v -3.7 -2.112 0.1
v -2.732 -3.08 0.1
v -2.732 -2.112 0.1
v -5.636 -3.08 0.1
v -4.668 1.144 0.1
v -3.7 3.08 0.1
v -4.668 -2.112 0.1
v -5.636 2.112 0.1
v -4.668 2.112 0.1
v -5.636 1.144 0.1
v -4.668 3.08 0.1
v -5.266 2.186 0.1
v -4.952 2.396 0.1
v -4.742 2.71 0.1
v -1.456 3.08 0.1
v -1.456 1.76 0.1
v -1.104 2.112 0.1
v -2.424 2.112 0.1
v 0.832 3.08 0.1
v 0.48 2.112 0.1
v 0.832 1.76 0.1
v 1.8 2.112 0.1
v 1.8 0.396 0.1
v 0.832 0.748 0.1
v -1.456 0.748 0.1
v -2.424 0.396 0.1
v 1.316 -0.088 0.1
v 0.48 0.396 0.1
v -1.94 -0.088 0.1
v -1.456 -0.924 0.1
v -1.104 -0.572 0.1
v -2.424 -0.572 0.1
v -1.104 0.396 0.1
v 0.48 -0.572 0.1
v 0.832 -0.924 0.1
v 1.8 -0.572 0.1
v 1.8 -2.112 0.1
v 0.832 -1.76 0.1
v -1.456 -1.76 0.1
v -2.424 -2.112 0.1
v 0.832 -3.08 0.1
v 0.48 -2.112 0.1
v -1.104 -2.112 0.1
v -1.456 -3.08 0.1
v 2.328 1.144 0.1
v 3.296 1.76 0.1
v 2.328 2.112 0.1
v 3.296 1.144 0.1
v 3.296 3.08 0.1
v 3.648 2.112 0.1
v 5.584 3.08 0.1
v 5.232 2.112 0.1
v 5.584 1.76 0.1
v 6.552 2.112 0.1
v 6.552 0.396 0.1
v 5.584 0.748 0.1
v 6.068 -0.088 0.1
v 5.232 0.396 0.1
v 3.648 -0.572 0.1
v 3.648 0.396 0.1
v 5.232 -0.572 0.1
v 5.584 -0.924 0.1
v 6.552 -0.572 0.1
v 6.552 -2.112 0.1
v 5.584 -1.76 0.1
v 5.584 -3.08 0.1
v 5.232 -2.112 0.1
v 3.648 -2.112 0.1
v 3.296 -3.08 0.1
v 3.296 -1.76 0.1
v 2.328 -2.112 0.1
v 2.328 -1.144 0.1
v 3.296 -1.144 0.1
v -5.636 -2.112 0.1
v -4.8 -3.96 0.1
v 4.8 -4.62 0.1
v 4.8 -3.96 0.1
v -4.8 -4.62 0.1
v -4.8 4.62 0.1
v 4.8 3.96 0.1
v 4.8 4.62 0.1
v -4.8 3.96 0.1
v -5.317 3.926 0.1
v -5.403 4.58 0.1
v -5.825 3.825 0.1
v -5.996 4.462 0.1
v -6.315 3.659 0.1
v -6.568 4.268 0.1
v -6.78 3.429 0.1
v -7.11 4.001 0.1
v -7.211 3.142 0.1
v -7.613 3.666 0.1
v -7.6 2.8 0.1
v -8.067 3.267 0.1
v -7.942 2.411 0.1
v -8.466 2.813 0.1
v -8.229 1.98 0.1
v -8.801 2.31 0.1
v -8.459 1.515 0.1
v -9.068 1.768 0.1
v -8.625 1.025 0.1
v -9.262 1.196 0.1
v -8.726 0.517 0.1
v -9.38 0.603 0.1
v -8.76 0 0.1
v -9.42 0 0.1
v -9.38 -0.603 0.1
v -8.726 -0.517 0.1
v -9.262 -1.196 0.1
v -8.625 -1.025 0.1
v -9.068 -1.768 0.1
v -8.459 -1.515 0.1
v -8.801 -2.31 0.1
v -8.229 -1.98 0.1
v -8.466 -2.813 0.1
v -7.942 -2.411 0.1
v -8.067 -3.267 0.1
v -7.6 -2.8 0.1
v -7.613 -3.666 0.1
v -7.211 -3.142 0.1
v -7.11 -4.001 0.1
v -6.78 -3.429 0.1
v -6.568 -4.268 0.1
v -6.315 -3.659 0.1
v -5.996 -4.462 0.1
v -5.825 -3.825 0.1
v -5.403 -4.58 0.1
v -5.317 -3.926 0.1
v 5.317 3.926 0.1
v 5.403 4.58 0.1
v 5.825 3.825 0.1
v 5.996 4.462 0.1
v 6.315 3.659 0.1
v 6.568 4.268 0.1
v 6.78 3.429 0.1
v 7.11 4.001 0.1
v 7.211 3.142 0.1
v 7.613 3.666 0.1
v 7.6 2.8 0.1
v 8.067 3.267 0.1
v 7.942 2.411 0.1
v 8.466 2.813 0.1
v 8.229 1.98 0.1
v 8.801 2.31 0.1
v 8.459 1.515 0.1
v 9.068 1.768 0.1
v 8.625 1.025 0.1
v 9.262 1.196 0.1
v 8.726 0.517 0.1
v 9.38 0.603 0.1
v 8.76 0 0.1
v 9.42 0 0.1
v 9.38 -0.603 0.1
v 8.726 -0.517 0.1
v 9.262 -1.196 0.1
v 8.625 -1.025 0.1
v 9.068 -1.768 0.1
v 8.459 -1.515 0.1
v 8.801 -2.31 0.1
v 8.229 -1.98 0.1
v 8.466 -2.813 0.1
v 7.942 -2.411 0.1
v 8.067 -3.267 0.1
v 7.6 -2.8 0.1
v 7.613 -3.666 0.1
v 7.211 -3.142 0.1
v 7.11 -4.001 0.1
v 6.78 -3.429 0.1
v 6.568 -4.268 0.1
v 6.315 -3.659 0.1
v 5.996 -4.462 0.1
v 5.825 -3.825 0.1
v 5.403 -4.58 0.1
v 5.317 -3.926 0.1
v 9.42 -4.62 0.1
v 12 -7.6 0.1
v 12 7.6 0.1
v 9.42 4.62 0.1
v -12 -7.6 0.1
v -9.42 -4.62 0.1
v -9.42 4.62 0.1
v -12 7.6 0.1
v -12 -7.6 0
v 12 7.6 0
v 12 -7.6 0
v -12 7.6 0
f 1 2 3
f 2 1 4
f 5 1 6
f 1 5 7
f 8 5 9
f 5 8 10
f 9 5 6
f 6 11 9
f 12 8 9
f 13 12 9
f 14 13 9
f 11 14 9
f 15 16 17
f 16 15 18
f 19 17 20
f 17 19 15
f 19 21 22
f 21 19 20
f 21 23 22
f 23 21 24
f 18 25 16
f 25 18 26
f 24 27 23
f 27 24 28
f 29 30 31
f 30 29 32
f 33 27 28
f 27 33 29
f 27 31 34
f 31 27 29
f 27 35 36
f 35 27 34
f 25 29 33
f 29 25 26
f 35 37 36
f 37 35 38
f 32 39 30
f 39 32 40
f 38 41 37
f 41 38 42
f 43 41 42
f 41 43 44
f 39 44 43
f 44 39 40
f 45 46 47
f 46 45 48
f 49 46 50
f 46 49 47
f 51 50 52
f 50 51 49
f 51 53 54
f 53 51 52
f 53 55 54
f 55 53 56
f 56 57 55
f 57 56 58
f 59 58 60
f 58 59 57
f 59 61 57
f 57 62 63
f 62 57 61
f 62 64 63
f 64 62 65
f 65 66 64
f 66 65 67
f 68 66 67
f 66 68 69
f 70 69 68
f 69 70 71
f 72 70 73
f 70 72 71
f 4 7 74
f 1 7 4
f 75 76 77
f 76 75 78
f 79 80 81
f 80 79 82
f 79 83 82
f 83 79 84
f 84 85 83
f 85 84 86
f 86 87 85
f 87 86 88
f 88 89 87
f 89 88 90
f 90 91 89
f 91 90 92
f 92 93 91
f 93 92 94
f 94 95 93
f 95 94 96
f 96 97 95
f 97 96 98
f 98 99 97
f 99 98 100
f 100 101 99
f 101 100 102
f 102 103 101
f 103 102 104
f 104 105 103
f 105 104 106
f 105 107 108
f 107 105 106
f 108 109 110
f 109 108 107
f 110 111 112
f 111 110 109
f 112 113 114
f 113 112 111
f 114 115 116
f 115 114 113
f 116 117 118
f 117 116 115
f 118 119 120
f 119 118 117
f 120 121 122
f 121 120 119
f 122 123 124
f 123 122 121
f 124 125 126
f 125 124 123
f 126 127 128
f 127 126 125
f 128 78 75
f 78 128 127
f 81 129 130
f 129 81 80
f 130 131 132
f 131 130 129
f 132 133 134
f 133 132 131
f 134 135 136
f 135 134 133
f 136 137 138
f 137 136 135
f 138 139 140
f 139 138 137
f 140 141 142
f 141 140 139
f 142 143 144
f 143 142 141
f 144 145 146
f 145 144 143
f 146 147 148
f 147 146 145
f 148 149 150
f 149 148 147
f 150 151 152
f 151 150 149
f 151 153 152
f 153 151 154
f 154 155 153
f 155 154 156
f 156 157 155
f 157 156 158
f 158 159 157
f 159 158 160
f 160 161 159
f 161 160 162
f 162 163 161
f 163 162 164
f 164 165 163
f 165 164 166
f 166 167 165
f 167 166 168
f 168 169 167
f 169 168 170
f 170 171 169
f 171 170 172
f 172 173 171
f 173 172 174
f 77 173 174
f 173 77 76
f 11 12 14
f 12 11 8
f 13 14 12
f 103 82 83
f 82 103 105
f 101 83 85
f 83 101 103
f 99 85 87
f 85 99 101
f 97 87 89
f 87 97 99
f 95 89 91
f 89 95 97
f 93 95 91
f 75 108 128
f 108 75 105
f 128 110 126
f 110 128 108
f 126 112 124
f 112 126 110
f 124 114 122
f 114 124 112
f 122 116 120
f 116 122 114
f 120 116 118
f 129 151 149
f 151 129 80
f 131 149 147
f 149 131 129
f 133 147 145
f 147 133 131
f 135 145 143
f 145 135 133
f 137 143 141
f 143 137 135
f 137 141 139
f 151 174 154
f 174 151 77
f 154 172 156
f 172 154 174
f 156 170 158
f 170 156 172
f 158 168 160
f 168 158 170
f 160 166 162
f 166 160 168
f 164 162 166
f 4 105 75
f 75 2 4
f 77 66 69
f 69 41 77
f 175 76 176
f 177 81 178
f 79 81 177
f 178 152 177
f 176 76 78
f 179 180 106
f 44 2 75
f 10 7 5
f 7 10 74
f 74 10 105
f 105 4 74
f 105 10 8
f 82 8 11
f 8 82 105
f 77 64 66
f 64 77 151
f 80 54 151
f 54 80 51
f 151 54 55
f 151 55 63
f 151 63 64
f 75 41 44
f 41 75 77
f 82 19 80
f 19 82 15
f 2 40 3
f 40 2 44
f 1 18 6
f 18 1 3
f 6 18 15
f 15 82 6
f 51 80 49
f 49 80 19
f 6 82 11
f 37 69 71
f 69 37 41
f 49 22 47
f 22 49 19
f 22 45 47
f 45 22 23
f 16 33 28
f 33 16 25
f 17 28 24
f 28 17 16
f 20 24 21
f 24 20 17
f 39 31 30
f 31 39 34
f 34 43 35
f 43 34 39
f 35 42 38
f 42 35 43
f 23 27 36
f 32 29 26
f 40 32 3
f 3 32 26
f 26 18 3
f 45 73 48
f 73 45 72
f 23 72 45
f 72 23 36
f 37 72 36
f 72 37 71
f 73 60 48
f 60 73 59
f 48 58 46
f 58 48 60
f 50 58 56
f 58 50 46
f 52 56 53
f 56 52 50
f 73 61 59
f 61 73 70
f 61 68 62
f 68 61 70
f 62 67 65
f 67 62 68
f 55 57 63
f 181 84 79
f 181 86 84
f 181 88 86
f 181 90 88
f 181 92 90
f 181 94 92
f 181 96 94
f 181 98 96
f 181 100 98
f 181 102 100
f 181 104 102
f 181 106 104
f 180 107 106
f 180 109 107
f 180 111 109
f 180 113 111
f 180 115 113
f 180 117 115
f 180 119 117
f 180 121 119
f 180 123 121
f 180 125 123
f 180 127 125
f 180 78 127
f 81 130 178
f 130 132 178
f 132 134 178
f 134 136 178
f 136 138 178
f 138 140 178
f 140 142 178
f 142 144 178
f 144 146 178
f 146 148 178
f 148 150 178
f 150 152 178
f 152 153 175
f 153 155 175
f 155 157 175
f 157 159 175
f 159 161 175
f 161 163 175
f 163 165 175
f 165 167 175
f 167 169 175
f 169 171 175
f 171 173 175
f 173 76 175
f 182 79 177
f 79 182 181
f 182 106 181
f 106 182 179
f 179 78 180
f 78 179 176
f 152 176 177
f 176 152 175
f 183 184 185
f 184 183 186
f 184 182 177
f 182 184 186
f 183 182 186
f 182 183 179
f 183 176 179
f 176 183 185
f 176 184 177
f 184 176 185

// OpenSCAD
// file: ../p/box5-12.scad
use <../lib.scad>
function ldraw_lib__box5_12() = [
// 0 Box with 5 Faces without Any Edges
// 0 Name: box5-12.dat
// 0 Author: Chris Dee [cwdee]
// 0 !LDRAW_ORG Primitive UPDATE 2009-02
// 0 !LICENSE Licensed under CC BY 2.0 and CC BY 4.0 : see CAreadme.txt
// 
// 0 BFC CERTIFY CCW
  [0,"BFC","CERTIFY"],
  [0,"BFC","CCW"],
// 
// 0 !HISTORY 2009-09-03 [PTadmin] Official Update 2009-02
// 
// 
// 4 16 1 1 1 1 1 -1 -1 1 -1 -1 1 1
  [4,16,1,1,1,1,1,-1,-1,1,-1,-1,1,1],
// 4 16 -1 0 1 1 0 1 1 1 1 -1 1 1
  [4,16,-1,0,1,1,0,1,1,1,1,-1,1,1],
// 4 16 -1 0 -1 -1 0 1 -1 1 1 -1 1 -1
  [4,16,-1,0,-1,-1,0,1,-1,1,1,-1,1,-1],
// 4 16 1 0 -1 -1 0 -1 -1 1 -1 1 1 -1
  [4,16,1,0,-1,-1,0,-1,-1,1,-1,1,1,-1],
// 4 16 1 0 1 1 0 -1 1 1 -1 1 1 1
  [4,16,1,0,1,1,0,-1,1,1,-1,1,1,1],
// 0
];
module ldraw_lib__box5_12(step=0, col=false, unit=2/5, alt=false, line=0.2, solid=!$preview)
    makepoly(ldraw_lib__box5_12(), step=step, col=col, unit=unit, alt=alt, line=line, solid=solid);
ldraw_lib__box5_12(line=0.2);
// file: ../p/48/2-4ring6.scad
use <../../lib.scad>
function ldraw_lib__48__2_4ring6() = [
// 0 Hi-Res Ring  6 x 0.5
// 0 Name: 48\2-4ring6.dat
// 0 Author: Guy Vivan [guyvivan]
// 0 !LDRAW_ORG 48_Primitive UPDATE 2009-01
// 0 !LICENSE Licensed under CC BY 2.0 and CC BY 4.0 : see CAreadme.txt
// 
// 0 BFC CERTIFY CCW
  [0,"BFC","CERTIFY"],
  [0,"BFC","CCW"],
// 
// 0 !HISTORY 2009-05-02 [PTadmin] Official Update 2009-01
// 
// 
// 4 16 6 0 0 7 0 0 6.9398 0 0.9135 5.9484 0 0.783
  [4,16,6,0,0,7,0,0,6.9398,0,0.9135,5.9484,0,0.783],
// 4 16 5.9484 0 0.783 6.9398 0 0.9135 6.7613 0 1.8116 5.7954 0 1.5528
  [4,16,5.9484,0,0.783,6.9398,0,0.9135,6.7613,0,1.8116,5.7954,0,1.5528],
// 4 16 5.7954 0 1.5528 6.7613 0 1.8116 6.4673 0 2.6789 5.5434 0 2.2962
  [4,16,5.7954,0,1.5528,6.7613,0,1.8116,6.4673,0,2.6789,5.5434,0,2.2962],
// 4 16 5.5434 0 2.2962 6.4673 0 2.6789 6.062 0 3.5 5.196 0 3
  [4,16,5.5434,0,2.2962,6.4673,0,2.6789,6.062,0,3.5,5.196,0,3],
// 4 16 5.196 0 3 6.062 0 3.5 5.5538 0 4.2616 4.7604 0 3.6528
  [4,16,5.196,0,3,6.062,0,3.5,5.5538,0,4.2616,4.7604,0,3.6528],
// 4 16 4.7604 0 3.6528 5.5538 0 4.2616 4.9497 0 4.9497 4.2426 0 4.2426
  [4,16,4.7604,0,3.6528,5.5538,0,4.2616,4.9497,0,4.9497,4.2426,0,4.2426],
// 4 16 4.2426 0 4.2426 4.9497 0 4.9497 4.2616 0 5.5538 3.6528 0 4.7604
  [4,16,4.2426,0,4.2426,4.9497,0,4.9497,4.2616,0,5.5538,3.6528,0,4.7604],
// 4 16 3.6528 0 4.7604 4.2616 0 5.5538 3.5 0 6.062 3 0 5.196
  [4,16,3.6528,0,4.7604,4.2616,0,5.5538,3.5,0,6.062,3,0,5.196],
// 4 16 3 0 5.196 3.5 0 6.062 2.6789 0 6.4673 2.2962 0 5.5434
  [4,16,3,0,5.196,3.5,0,6.062,2.6789,0,6.4673,2.2962,0,5.5434],
// 4 16 2.2962 0 5.5434 2.6789 0 6.4673 1.8116 0 6.7613 1.5528 0 5.7954
  [4,16,2.2962,0,5.5434,2.6789,0,6.4673,1.8116,0,6.7613,1.5528,0,5.7954],
// 4 16 1.5528 0 5.7954 1.8116 0 6.7613 0.9135 0 6.9398 0.783 0 5.9484
  [4,16,1.5528,0,5.7954,1.8116,0,6.7613,0.9135,0,6.9398,0.783,0,5.9484],
// 4 16 0.783 0 5.9484 0.9135 0 6.9398 0 0 7 0 0 6
  [4,16,0.783,0,5.9484,0.9135,0,6.9398,0,0,7,0,0,6],
// 4 16 0 0 6 0 0 7 -0.9135 0 6.9398 -0.783 0 5.9484
  [4,16,0,0,6,0,0,7,-0.9135,0,6.9398,-0.783,0,5.9484],
// 4 16 -0.783 0 5.9484 -0.9135 0 6.9398 -1.8116 0 6.7613 -1.5528 0 5.7954
  [4,16,-0.783,0,5.9484,-0.9135,0,6.9398,-1.8116,0,6.7613,-1.5528,0,5.7954],
// 4 16 -1.5528 0 5.7954 -1.8116 0 6.7613 -2.6789 0 6.4673 -2.2962 0 5.5434
  [4,16,-1.5528,0,5.7954,-1.8116,0,6.7613,-2.6789,0,6.4673,-2.2962,0,5.5434],
// 4 16 -2.2962 0 5.5434 -2.6789 0 6.4673 -3.5 0 6.062 -3 0 5.196
  [4,16,-2.2962,0,5.5434,-2.6789,0,6.4673,-3.5,0,6.062,-3,0,5.196],
// 4 16 -3 0 5.196 -3.5 0 6.062 -4.2616 0 5.5538 -3.6528 0 4.7604
  [4,16,-3,0,5.196,-3.5,0,6.062,-4.2616,0,5.5538,-3.6528,0,4.7604],
// 4 16 -3.6528 0 4.7604 -4.2616 0 5.5538 -4.9497 0 4.9497 -4.2426 0 4.2426
  [4,16,-3.6528,0,4.7604,-4.2616,0,5.5538,-4.9497,0,4.9497,-4.2426,0,4.2426],
// 4 16 -4.2426 0 4.2426 -4.9497 0 4.9497 -5.5538 0 4.2616 -4.7604 0 3.6528
  [4,16,-4.2426,0,4.2426,-4.9497,0,4.9497,-5.5538,0,4.2616,-4.7604,0,3.6528],
// 4 16 -4.7604 0 3.6528 -5.5538 0 4.2616 -6.062 0 3.5 -5.196 0 3
  [4,16,-4.7604,0,3.6528,-5.5538,0,4.2616,-6.062,0,3.5,-5.196,0,3],
// 4 16 -5.196 0 3 -6.062 0 3.5 -6.4673 0 2.6789 -5.5434 0 2.2962
  [4,16,-5.196,0,3,-6.062,0,3.5,-6.4673,0,2.6789,-5.5434,0,2.2962],
// 4 16 -5.5434 0 2.2962 -6.4673 0 2.6789 -6.7613 0 1.8116 -5.7954 0 1.5528
  [4,16,-5.5434,0,2.2962,-6.4673,0,2.6789,-6.7613,0,1.8116,-5.7954,0,1.5528],
// 4 16 -5.7954 0 1.5528 -6.7613 0 1.8116 -6.9398 0 0.9135 -5.9484 0 0.783
  [4,16,-5.7954,0,1.5528,-6.7613,0,1.8116,-6.9398,0,0.9135,-5.9484,0,0.783],
// 4 16 -5.9484 0 0.783 -6.9398 0 0.9135 -7 0 0 -6 0 0
  [4,16,-5.9484,0,0.783,-6.9398,0,0.9135,-7,0,0,-6,0,0],
// 
// 0 end of file
// 
];
module ldraw_lib__48__2_4ring6(step=0, col=false, unit=2/5, alt=false, line=0.2, solid=!$preview)
    makepoly(ldraw_lib__48__2_4ring6(), step=step, col=col, unit=unit, alt=alt, line=line, solid=solid);
ldraw_lib__48__2_4ring6(line=0.2);
// file: ../p/48/2-4ndis.scad
use <../../lib.scad>
function ldraw_lib__48__2_4ndis() = [
// 0 Hi-Res Disc Negative 0.5
// 0 Name: 48\2-4ndis.dat
// 0 Author: Guy Vivan [guyvivan]
// 0 !LDRAW_ORG 48_Primitive UPDATE 2009-01
// 0 !LICENSE Licensed under CC BY 2.0 and CC BY 4.0 : see CAreadme.txt
// 
// 0 BFC CERTIFY CCW
  [0,"BFC","CERTIFY"],
  [0,"BFC","CCW"],
// 
// 0 !HISTORY 2009-05-02 [PTadmin] Official Update 2009-01
// 
// 
// 3 16 1 0 1 0.9914 0 0.1305 1 0 0
  [3,16,1,0,1,0.9914,0,0.1305,1,0,0],
// 3 16 1 0 1 0.9659 0 0.2588 0.9914 0 0.1305
  [3,16,1,0,1,0.9659,0,0.2588,0.9914,0,0.1305],
// 3 16 1 0 1 0.9239 0 0.3827 0.9659 0 0.2588
  [3,16,1,0,1,0.9239,0,0.3827,0.9659,0,0.2588],
// 3 16 1 0 1 0.866 0 0.5 0.9239 0 0.3827
  [3,16,1,0,1,0.866,0,0.5,0.9239,0,0.3827],
// 3 16 1 0 1 0.7934 0 0.6088 0.866 0 0.5
  [3,16,1,0,1,0.7934,0,0.6088,0.866,0,0.5],
// 3 16 1 0 1 0.7071 0 0.7071 0.7934 0 0.6088
  [3,16,1,0,1,0.7071,0,0.7071,0.7934,0,0.6088],
// 3 16 1 0 1 0.6088 0 0.7934 0.7071 0 0.7071
  [3,16,1,0,1,0.6088,0,0.7934,0.7071,0,0.7071],
// 3 16 1 0 1 0.5 0 0.866 0.6088 0 0.7934
  [3,16,1,0,1,0.5,0,0.866,0.6088,0,0.7934],
// 3 16 1 0 1 0.3827 0 0.9239 0.5 0 0.866
  [3,16,1,0,1,0.3827,0,0.9239,0.5,0,0.866],
// 3 16 1 0 1 0.2588 0 0.9659 0.3827 0 0.9239
  [3,16,1,0,1,0.2588,0,0.9659,0.3827,0,0.9239],
// 3 16 1 0 1 0.1305 0 0.9914 0.2588 0 0.9659
  [3,16,1,0,1,0.1305,0,0.9914,0.2588,0,0.9659],
// 3 16 1 0 1 0 0 1 0.1305 0 0.9914
  [3,16,1,0,1,0,0,1,0.1305,0,0.9914],
// 3 16 -1 0 1 -0.1305 0 0.9914 0 0 1
  [3,16,-1,0,1,-0.1305,0,0.9914,0,0,1],
// 3 16 -1 0 1 -0.2588 0 0.9659 -0.1305 0 0.9914
  [3,16,-1,0,1,-0.2588,0,0.9659,-0.1305,0,0.9914],
// 3 16 -1 0 1 -0.3827 0 0.9239 -0.2588 0 0.9659
  [3,16,-1,0,1,-0.3827,0,0.9239,-0.2588,0,0.9659],
// 3 16 -1 0 1 -0.5 0 0.866 -0.3827 0 0.9239
  [3,16,-1,0,1,-0.5,0,0.866,-0.3827,0,0.9239],
// 3 16 -1 0 1 -0.6088 0 0.7934 -0.5 0 0.866
  [3,16,-1,0,1,-0.6088,0,0.7934,-0.5,0,0.866],
// 3 16 -1 0 1 -0.7071 0 0.7071 -0.6088 0 0.7934
  [3,16,-1,0,1,-0.7071,0,0.7071,-0.6088,0,0.7934],
// 3 16 -1 0 1 -0.7934 0 0.6088 -0.7071 0 0.7071
  [3,16,-1,0,1,-0.7934,0,0.6088,-0.7071,0,0.7071],
// 3 16 -1 0 1 -0.866 0 0.5 -0.7934 0 0.6088
  [3,16,-1,0,1,-0.866,0,0.5,-0.7934,0,0.6088],
// 3 16 -1 0 1 -0.9239 0 0.3827 -0.866 0 0.5
  [3,16,-1,0,1,-0.9239,0,0.3827,-0.866,0,0.5],
// 3 16 -1 0 1 -0.9659 0 0.2588 -0.9239 0 0.3827
  [3,16,-1,0,1,-0.9659,0,0.2588,-0.9239,0,0.3827],
// 3 16 -1 0 1 -0.9914 0 0.1305 -0.9659 0 0.2588
  [3,16,-1,0,1,-0.9914,0,0.1305,-0.9659,0,0.2588],
// 3 16 -1 0 1 -1 0 0 -0.9914 0 0.1305
  [3,16,-1,0,1,-1,0,0,-0.9914,0,0.1305],
// 
// 0 end of file
// 
];
module ldraw_lib__48__2_4ndis(step=0, col=false, unit=2/5, alt=false, line=0.2, solid=!$preview)
    makepoly(ldraw_lib__48__2_4ndis(), step=step, col=col, unit=unit, alt=alt, line=line, solid=solid);
ldraw_lib__48__2_4ndis(line=0.2);
// file: ../p/48/1-4chrd.scad
use <../../lib.scad>
function ldraw_lib__48__1_4chrd() = [
// 0 Hi-Res Chord 0.25
// 0 Name: 48\1-4chrd.dat
// 0 Author: Andy Westrate [westrate]
// 0 !LDRAW_ORG 48_Primitive UPDATE 2012-02
// 0 !LICENSE Licensed under CC BY 2.0 and CC BY 4.0 : see CAreadme.txt
// 
// 0 BFC CERTIFY CCW
  [0,"BFC","CERTIFY"],
  [0,"BFC","CCW"],
// 
// 0 !HISTORY 2009-05-02 [PTadmin] Official Update 2009-01
// 0 !HISTORY 2012-08-02 [MMR1988] Re-creation with PrimGen2 and Rectifier
// 0 !HISTORY 2012-08-09 [PTadmin] Official Update 2012-02
// 
// 
// 4 16 0.9914 0 0.1305 0.1305 0 0.9914 0 0 1 1 0 0
  [4,16,0.9914,0,0.1305,0.1305,0,0.9914,0,0,1,1,0,0],
// 4 16 0.9659 0 0.2588 0.2588 0 0.9659 0.1305 0 0.9914 0.9914 0 0.1305
  [4,16,0.9659,0,0.2588,0.2588,0,0.9659,0.1305,0,0.9914,0.9914,0,0.1305],
// 4 16 0.9239 0 0.3827 0.3827 0 0.9239 0.2588 0 0.9659 0.9659 0 0.2588
  [4,16,0.9239,0,0.3827,0.3827,0,0.9239,0.2588,0,0.9659,0.9659,0,0.2588],
// 4 16 0.866 0 0.5 0.5 0 0.866 0.3827 0 0.9239 0.9239 0 0.3827
  [4,16,0.866,0,0.5,0.5,0,0.866,0.3827,0,0.9239,0.9239,0,0.3827],
// 4 16 0.7934 0 0.6088 0.6088 0 0.7934 0.5 0 0.866 0.866 0 0.5
  [4,16,0.7934,0,0.6088,0.6088,0,0.7934,0.5,0,0.866,0.866,0,0.5],
// 3 16 0.7071 0 0.7071 0.6088 0 0.7934 0.7934 0 0.6088
  [3,16,0.7071,0,0.7071,0.6088,0,0.7934,0.7934,0,0.6088],
];
module ldraw_lib__48__1_4chrd(step=0, col=false, unit=2/5, alt=false, line=0.2, solid=!$preview)
    makepoly(ldraw_lib__48__1_4chrd(), step=step, col=col, unit=unit, alt=alt, line=line, solid=solid);
ldraw_lib__48__1_4chrd(line=0.2);
// file: ../p/1-4ndis.scad
use <../lib.scad>
function ldraw_lib__1_4ndis() = [
// 0 Disc Negative 0.25
// 0 Name: 1-4ndis.dat
// 0 Author: James Jessiman
// 0 !LDRAW_ORG Primitive UPDATE 2012-01
// 0 !LICENSE Licensed under CC BY 2.0 and CC BY 4.0 : see CAreadme.txt
// 
// 0 BFC CERTIFY CCW
  [0,"BFC","CERTIFY"],
  [0,"BFC","CCW"],
// 
// 0 !HISTORY 2002-03-23 [sbliss] Added BFC Statement
// 0 !HISTORY 2002-04-25 [PTadmin] Official Update 2002-02
// 0 !HISTORY 2007-06-22 [PTadmin] Header formatted for Contributor Agreement
// 0 !HISTORY 2008-07-01 [PTadmin] Official Update 2008-01
// 0 !HISTORY 2012-02-16 [Philo] Changed to CCW
// 0 !HISTORY 2012-03-30 [PTadmin] Official Update 2012-01
// 
// 
// 3 16 0.9239 0 0.3827 1 0 0 1 0 1
  [3,16,0.9239,0,0.3827,1,0,0,1,0,1],
// 3 16 0.7071 0 0.7071 0.9239 0 0.3827 1 0 1
  [3,16,0.7071,0,0.7071,0.9239,0,0.3827,1,0,1],
// 3 16 0.3827 0 0.9239 0.7071 0 0.7071 1 0 1
  [3,16,0.3827,0,0.9239,0.7071,0,0.7071,1,0,1],
// 3 16 0 0 1 0.3827 0 0.9239 1 0 1
  [3,16,0,0,1,0.3827,0,0.9239,1,0,1],
];
module ldraw_lib__1_4ndis(step=0, col=false, unit=2/5, alt=false, line=0.2, solid=!$preview)
    makepoly(ldraw_lib__1_4ndis(), step=step, col=col, unit=unit, alt=alt, line=line, solid=solid);
ldraw_lib__1_4ndis(line=0.2);
// file: ../p/1-4chrd.scad
use <../lib.scad>
function ldraw_lib__1_4chrd() = [
// 0 Chord 0.25
// 0 Name: 1-4chrd.dat
// 0 Author: Tony Hafner [hafhead]
// 0 !LDRAW_ORG Primitive UPDATE 2012-02
// 0 !LICENSE Licensed under CC BY 2.0 and CC BY 4.0 : see CAreadme.txt
// 
// 0 BFC CERTIFY CCW
  [0,"BFC","CERTIFY"],
  [0,"BFC","CCW"],
// 
// 0 !HISTORY 2004-04-22 [PTadmin] Official Update 2004-02
// 0 !HISTORY 2007-10-09 [PTadmin] Header formatted for Contributor Agreement
// 0 !HISTORY 2008-07-01 [PTadmin] Official Update 2008-01
// 0 !HISTORY 2012-08-02 [MMR1988] Re-creation with PrimGen2 and Rectifier
// 0 !HISTORY 2012-08-09 [PTadmin] Official Update 2012-02
// 
// 
// 4 16 0.9239 0 0.3827 0.3827 0 0.9239 0 0 1 1 0 0
  [4,16,0.9239,0,0.3827,0.3827,0,0.9239,0,0,1,1,0,0],
// 3 16 0.7071 0 0.7071 0.3827 0 0.9239 0.9239 0 0.3827
  [3,16,0.7071,0,0.7071,0.3827,0,0.9239,0.9239,0,0.3827],
];
module ldraw_lib__1_4chrd(step=0, col=false, unit=2/5, alt=false, line=0.2, solid=!$preview)
    makepoly(ldraw_lib__1_4chrd(), step=step, col=col, unit=unit, alt=alt, line=line, solid=solid);
ldraw_lib__1_4chrd(line=0.2);
// main file
use <../lib.scad>
use <../p/1-4chrd.scad>
use <../p/1-4ndis.scad>
use <../p/48/1-4chrd.scad>
use <../p/48/2-4ndis.scad>
use <../p/48/2-4ring6.scad>
use <../p/box5-12.scad>
function ldraw_lib__004747a() = [
// 0 Sticker  1.9 x  3 with White "183" on Red
// 0 Name: 004747a.dat
// 0 Author: Alex Taylor [anathema]
// 0 !LDRAW_ORG Part UPDATE 2020-02
// 0 !LICENSE Licensed under CC BY 2.0 and CC BY 4.0 : see CAreadme.txt
// 
// 0 BFC CERTIFY CCW
  [0,"BFC","CERTIFY"],
  [0,"BFC","CCW"],
// 
// 0 !KEYWORDS set 183, Train
// 
// 0 !HISTORY 2009-05-02 [PTadmin] Official Update 2009-01
// 0 !HISTORY 2016-07-01 [cwdee] Updated description
// 0 !HISTORY 2016-12-31 [PTadmin] Official Update 2016-01
// 0 !HISTORY 2019-08-10 [anathema] Corrected colour of backing box and replaced with box5-12 primitive
// 0 !HISTORY 2020-09-05 [PTadmin] Official Update 2020-02
// 
// 
// 0 // White
// 4 15 -14.09 -.25 -7.7 -6.83 -.25 -7.7 -6.83 -.25 -5.28 -9.25 -.25 -5.28
  [4,15,-14.09,-.25,-7.7,-6.83,-.25,-7.7,-6.83,-.25,-5.28,-9.25,-.25,-5.28],
// 4 15 -9.25 -0.25 -5.28 -9.25 -0.25 7.7 -11.67 -0.25 2.86 -11.67 -0.25 -5.28
  [4,15,-9.25,-0.25,-5.28,-9.25,-0.25,7.7,-11.67,-0.25,2.86,-11.67,-0.25,-5.28],
// 4 15 -14.09 -0.25 5.28 -14.09 -0.25 2.86 -11.67 -0.25 2.86 -11.67 -0.25 5.28
  [4,15,-14.09,-0.25,5.28,-14.09,-0.25,2.86,-11.67,-0.25,2.86,-11.67,-0.25,5.28],
// 3 15 -11.67 -0.25 5.28 -11.67 -0.25 2.86 -9.25 -0.25 7.7
  [3,15,-11.67,-0.25,5.28,-11.67,-0.25,2.86,-9.25,-0.25,7.7],
// 3 15 -9.25 -0.25 7.7 -11.67 -0.25 7.7 -11.67 -0.25 5.28
  [3,15,-9.25,-0.25,7.7,-11.67,-0.25,7.7,-11.67,-0.25,5.28],
// 1 15 -14.09 -0.25 7.7 0 0 2.42 0 1 0 -2.42 0 0 1-4ndis.dat
  [1,15,-14.09,-0.25,7.7,0,0,2.42,0,1,0,-2.42,0,0, ldraw_lib__1_4ndis()],
// 4 15 -3.64 -0.25 4.4 -2.76 -0.25 5.28 -3.64 -0.25 7.7 -6.06 -0.25 5.28
  [4,15,-3.64,-0.25,4.4,-2.76,-0.25,5.28,-3.64,-0.25,7.7,-6.06,-0.25,5.28],
// 4 15 -2.76 -0.25 5.28 1.2 -0.25 5.28 2.08 -0.25 7.7 -3.64 -0.25 7.7
  [4,15,-2.76,-0.25,5.28,1.2,-0.25,5.28,2.08,-0.25,7.7,-3.64,-0.25,7.7],
// 4 15 1.2 -0.25 5.28 2.08 -0.25 4.4 4.5 -0.25 5.28 2.08 -0.25 7.7
  [4,15,1.2,-0.25,5.28,2.08,-0.25,4.4,4.5,-0.25,5.28,2.08,-0.25,7.7],
// 4 15 2.08 -0.25 4.4 2.08 -0.25 1.87 4.5 -0.25 0.99 4.5 -0.25 5.28
  [4,15,2.08,-0.25,4.4,2.08,-0.25,1.87,4.5,-0.25,0.99,4.5,-0.25,5.28],
// 4 15 -3.64 -0.25 1.87 -3.64 -0.25 4.4 -6.06 -0.25 5.28 -6.06 -0.25 0.99
  [4,15,-3.64,-0.25,1.87,-3.64,-0.25,4.4,-6.06,-0.25,5.28,-6.06,-0.25,0.99],
// 4 15 2.08 -.25 1.87 1.2 -.25 .99 3.29 -.25 -.22 4.5 -.25 .99
  [4,15,2.08,-.25,1.87,1.2,-.25,.99,3.29,-.25,-.22,4.5,-.25,.99],
// 4 15 -3.64 -.25 -2.31 -2.76 -.25 -1.43 -4.85 -.25 -.22 -6.06 -.25 -1.43
  [4,15,-3.64,-.25,-2.31,-2.76,-.25,-1.43,-4.85,-.25,-.22,-6.06,-.25,-1.43],
// 4 15 1.2 -.25 .99 -2.76 -.25 .99 -4.85 -.25 -.22 3.29 -.25 -.22
  [4,15,1.2,-.25,.99,-2.76,-.25,.99,-4.85,-.25,-.22,3.29,-.25,-.22],
// 4 15 3.29 -.25 -.22 -4.85 -.25 -.22 -2.76 -.25 -1.43 1.2 -.25 -1.43
  [4,15,3.29,-.25,-.22,-4.85,-.25,-.22,-2.76,-.25,-1.43,1.2,-.25,-1.43],
// 4 15 1.2 -.25 -1.43 2.08 -.25 -2.31 4.5 -.25 -1.43 3.29 -.25 -.22
  [4,15,1.2,-.25,-1.43,2.08,-.25,-2.31,4.5,-.25,-1.43,3.29,-.25,-.22],
// 4 15 -2.76 -.25 .99 -3.64 -.25 1.87 -6.06 -.25 .99 -4.85 -.25 -.22
  [4,15,-2.76,-.25,.99,-3.64,-.25,1.87,-6.06,-.25,.99,-4.85,-.25,-.22],
// 4 15 2.08 -0.25 -2.31 2.08 -0.25 -4.4 4.5 -0.25 -5.28 4.5 -0.25 -1.43
  [4,15,2.08,-0.25,-2.31,2.08,-0.25,-4.4,4.5,-0.25,-5.28,4.5,-0.25,-1.43],
// 4 15 -3.64 -0.25 -4.4 -3.64 -0.25 -2.31 -6.06 -0.25 -1.43 -6.06 -0.25 -5.28
  [4,15,-3.64,-0.25,-4.4,-3.64,-0.25,-2.31,-6.06,-0.25,-1.43,-6.06,-0.25,-5.28],
// 4 15 2.08 -0.25 -4.4 1.2 -0.25 -5.28 2.08 -0.25 -7.7 4.5 -0.25 -5.28
  [4,15,2.08,-0.25,-4.4,1.2,-0.25,-5.28,2.08,-0.25,-7.7,4.5,-0.25,-5.28],
// 4 15 1.2 -0.25 -5.28 -2.76 -0.25 -5.28 -3.64 -0.25 -7.7 2.08 -0.25 -7.7
  [4,15,1.2,-0.25,-5.28,-2.76,-0.25,-5.28,-3.64,-0.25,-7.7,2.08,-0.25,-7.7],
// 4 15 -2.76 -0.25 -5.28 -3.64 -0.25 -4.4 -6.06 -0.25 -5.28 -3.64 -0.25 -7.7
  [4,15,-2.76,-0.25,-5.28,-3.64,-0.25,-4.4,-6.06,-0.25,-5.28,-3.64,-0.25,-7.7],
// 4 15 5.82 -0.25 5.28 5.82 -0.25 2.86 8.24 -0.25 2.86 8.24 -0.25 4.4
  [4,15,5.82,-0.25,5.28,5.82,-0.25,2.86,8.24,-0.25,2.86,8.24,-0.25,4.4],
// 4 15 8.24 -0.25 4.4 9.12 -0.25 5.28 8.24 -0.25 7.7 5.82 -0.25 5.28
  [4,15,8.24,-0.25,4.4,9.12,-0.25,5.28,8.24,-0.25,7.7,5.82,-0.25,5.28],
// 4 15 9.12 -0.25 5.28 13.08 -0.25 5.28 13.96 -0.25 7.7 8.24 -0.25 7.7
  [4,15,9.12,-0.25,5.28,13.08,-0.25,5.28,13.96,-0.25,7.7,8.24,-0.25,7.7],
// 4 15 13.08 -0.25 5.28 13.96 -0.25 4.4 16.38 -0.25 5.28 13.96 -0.25 7.7
  [4,15,13.08,-0.25,5.28,13.96,-0.25,4.4,16.38,-0.25,5.28,13.96,-0.25,7.7],
// 4 15 13.96 -0.25 4.4 13.96 -0.25 1.87 16.38 -0.25 0.99 16.38 -0.25 5.28
  [4,15,13.96,-0.25,4.4,13.96,-0.25,1.87,16.38,-0.25,0.99,16.38,-0.25,5.28],
// 4 15 13.96 -0.25 1.87 13.08 -0.25 0.99 15.17 -0.25 -0.22 16.38 -0.25 0.99
  [4,15,13.96,-0.25,1.87,13.08,-0.25,0.99,15.17,-0.25,-0.22,16.38,-0.25,0.99],
// 4 15 13.08 -0.25 0.99 9.12 -0.25 0.99 9.12 -0.25 -1.43 15.17 -0.25 -0.22
  [4,15,13.08,-0.25,0.99,9.12,-0.25,0.99,9.12,-0.25,-1.43,15.17,-0.25,-0.22],
// 3 15 9.12 -0.25 -1.43 13.08 -0.25 -1.43 15.17 -0.25 -0.22
  [3,15,9.12,-0.25,-1.43,13.08,-0.25,-1.43,15.17,-0.25,-0.22],
// 4 15 13.08 -0.25 -1.43 13.96 -0.25 -2.31 16.38 -0.25 -1.43 15.17 -0.25 -0.22
  [4,15,13.08,-0.25,-1.43,13.96,-0.25,-2.31,16.38,-0.25,-1.43,15.17,-0.25,-0.22],
// 4 15 13.96 -0.25 -2.31 13.96 -0.25 -4.4 16.38 -0.25 -5.28 16.38 -0.25 -1.43
  [4,15,13.96,-0.25,-2.31,13.96,-0.25,-4.4,16.38,-0.25,-5.28,16.38,-0.25,-1.43],
// 4 15 13.96 -0.25 -4.4 13.08 -0.25 -5.28 13.96 -0.25 -7.7 16.38 -0.25 -5.28
  [4,15,13.96,-0.25,-4.4,13.08,-0.25,-5.28,13.96,-0.25,-7.7,16.38,-0.25,-5.28],
// 4 15 13.08 -0.25 -5.28 9.12 -0.25 -5.28 8.24 -0.25 -7.7 13.96 -0.25 -7.7
  [4,15,13.08,-0.25,-5.28,9.12,-0.25,-5.28,8.24,-0.25,-7.7,13.96,-0.25,-7.7],
// 4 15 9.12 -0.25 -5.28 8.24 -0.25 -4.4 5.82 -0.25 -5.28 8.24 -0.25 -7.7
  [4,15,9.12,-0.25,-5.28,8.24,-0.25,-4.4,5.82,-0.25,-5.28,8.24,-0.25,-7.7],
// 4 15 8.24 -0.25 -4.4 8.24 -0.25 -2.86 5.82 -0.25 -2.86 5.82 -0.25 -5.28
  [4,15,8.24,-0.25,-4.4,8.24,-0.25,-2.86,5.82,-0.25,-2.86,5.82,-0.25,-5.28],
// 3 15 -14.09 -.25 -7.7 -11.67 -.25 -5.28 -14.09 -.25 -5.28
  [3,15,-14.09,-.25,-7.7,-11.67,-.25,-5.28,-14.09,-.25,-5.28],
// 3 15 -9.25 -.25 -5.28 -11.67 -.25 -5.28 -14.09 -.25 -7.7
  [3,15,-9.25,-.25,-5.28,-11.67,-.25,-5.28,-14.09,-.25,-7.7],
// 4 15 -12 -0.25 -11.55 12 -0.25 -11.55 12 -0.25 -9.9 -12 -0.25 -9.9
  [4,15,-12,-0.25,-11.55,12,-0.25,-11.55,12,-0.25,-9.9,-12,-0.25,-9.9],
// 4 15 -12 -0.25 9.9 12 -0.25 9.9 12 -0.25 11.55 -12 -0.25 11.55
  [4,15,-12,-0.25,9.9,12,-0.25,9.9,12,-0.25,11.55,-12,-0.25,11.55],
// 1 15 -12 -0.25 0 0 0 -1.65 0 1 0 1.65 0 0 48\2-4ring6.dat
  [1,15,-12,-0.25,0,0,0,-1.65,0,1,0,1.65,0,0, ldraw_lib__48__2_4ring6()],
// 1 15 12 -0.25 0 0 0 1.65 0 1 0 1.65 0 0 48\2-4ring6.dat
  [1,15,12,-0.25,0,0,0,1.65,0,1,0,1.65,0,0, ldraw_lib__48__2_4ring6()],
// 
// 0 // Red
// 1 4 -14.09 -.25 7.7 0 0 2.42 0 1 0 -2.42 0 0 1-4chrd.dat
  [1,4,-14.09,-.25,7.7,0,0,2.42,0,1,0,-2.42,0,0, ldraw_lib__1_4chrd()],
// 1 4 -12 -.25 0 0 0 -9.9 0 1 0 9.9 0 0 48\1-4chrd.dat
  [1,4,-12,-.25,0,0,0,-9.9,0,1,0,9.9,0,0, ldraw_lib__48__1_4chrd()],
// 1 4 -12 -.25 0 0 0 -9.9 0 1 0 -9.9 0 0 48\1-4chrd.dat
  [1,4,-12,-.25,0,0,0,-9.9,0,1,0,-9.9,0,0, ldraw_lib__48__1_4chrd()],
// 1 4 12 -.25 0 0 0 9.9 0 1 0 9.9 0 0 48\1-4chrd.dat
  [1,4,12,-.25,0,0,0,9.9,0,1,0,9.9,0,0, ldraw_lib__48__1_4chrd()],
// 1 4 12 -.25 0 0 0 9.9 0 1 0 -9.9 0 0 48\1-4chrd.dat
  [1,4,12,-.25,0,0,0,9.9,0,1,0,-9.9,0,0, ldraw_lib__48__1_4chrd()],
// 3 4 -14.09 -.25 -7.7 -21.9 -.25 0 -12 -.25 -9.9
  [3,4,-14.09,-.25,-7.7,-21.9,-.25,0,-12,-.25,-9.9],
// 3 4 -12 -.25 -9.9 -6.83 -.25 -7.7 -14.09 -.25 -7.7
  [3,4,-12,-.25,-9.9,-6.83,-.25,-7.7,-14.09,-.25,-7.7],
// 3 4 12 -.25 -9.9 13.96 -.25 -7.7 8.24 -.25 -7.7
  [3,4,12,-.25,-9.9,13.96,-.25,-7.7,8.24,-.25,-7.7],
// 3 4 8.24 -.25 -7.7 2.08 -.25 -7.7 12 -.25 -9.9
  [3,4,8.24,-.25,-7.7,2.08,-.25,-7.7,12,-.25,-9.9],
// 3 4 23.55 -.25 -11.55 12 -.25 -11.55 30 -.25 -19
  [3,4,23.55,-.25,-11.55,12,-.25,-11.55,30,-.25,-19],
// 3 4 30 -.25 19 12 -.25 11.55 23.55 -.25 11.55
  [3,4,30,-.25,19,12,-.25,11.55,23.55,-.25,11.55],
// 3 4 -12 -.25 11.55 12 -.25 11.55 30 -.25 19
  [3,4,-12,-.25,11.55,12,-.25,11.55,30,-.25,19],
// 3 4 23.55 -.25 11.55 23.55 -.25 0 30 -.25 19
  [3,4,23.55,-.25,11.55,23.55,-.25,0,30,-.25,19],
// 3 4 30 -.25 -19 12 -.25 -11.55 -12 -.25 -11.55
  [3,4,30,-.25,-19,12,-.25,-11.55,-12,-.25,-11.55],
// 3 4 -30 -.25 -19 -23.55 -.25 -11.55 -23.55 -.25 0
  [3,4,-30,-.25,-19,-23.55,-.25,-11.55,-23.55,-.25,0],
// 3 4 -3.64 -.25 -7.7 -6.83 -.25 -7.7 -12 -.25 -9.9
  [3,4,-3.64,-.25,-7.7,-6.83,-.25,-7.7,-12,-.25,-9.9],
// 4 4 -14.09 -.25 -5.28 -11.67 -.25 -5.28 -11.67 -.25 2.86 -14.09 -.25 2.86
  [4,4,-14.09,-.25,-5.28,-11.67,-.25,-5.28,-11.67,-.25,2.86,-14.09,-.25,2.86],
// 3 4 -14.09 -.25 -5.28 -14.09 -.25 2.86 -21.9 -.25 0
  [3,4,-14.09,-.25,-5.28,-14.09,-.25,2.86,-21.9,-.25,0],
// 3 4 -21.9 -.25 0 -14.09 -.25 -7.7 -14.09 -.25 -5.28
  [3,4,-21.9,-.25,0,-14.09,-.25,-7.7,-14.09,-.25,-5.28],
// 3 4 -21.9 -.25 0 -14.09 -.25 2.86 -14.09 -.25 5.28
  [3,4,-21.9,-.25,0,-14.09,-.25,2.86,-14.09,-.25,5.28],
// 4 4 -21.9 -.25 0 -14.09 -.25 5.28 -11.67 -.25 7.7 -12 -.25 9.9
  [4,4,-21.9,-.25,0,-14.09,-.25,5.28,-11.67,-.25,7.7,-12,-.25,9.9],
// 4 4 12 -.25 -9.9 21.9 -.25 0 16.38 -.25 -5.28 13.96 -.25 -7.7
  [4,4,12,-.25,-9.9,21.9,-.25,0,16.38,-.25,-5.28,13.96,-.25,-7.7],
// 4 4 13.96 -.25 7.7 16.38 -.25 5.28 21.9 -.25 0 12 -.25 9.9
  [4,4,13.96,-.25,7.7,16.38,-.25,5.28,21.9,-.25,0,12,-.25,9.9],
// 3 4 21.9 -.25 0 16.38 -.25 5.28 16.38 -.25 .99
  [3,4,21.9,-.25,0,16.38,-.25,5.28,16.38,-.25,.99],
// 3 4 21.9 -.25 0 16.38 -.25 .99 16.38 -.25 -1.43
  [3,4,21.9,-.25,0,16.38,-.25,.99,16.38,-.25,-1.43],
// 3 4 21.9 -.25 0 16.38 -.25 -1.43 16.38 -.25 -5.28
  [3,4,21.9,-.25,0,16.38,-.25,-1.43,16.38,-.25,-5.28],
// 4 4 -12 -.25 -9.9 12 -.25 -9.9 2.08 -.25 -7.7 -3.64 -.25 -7.7
  [4,4,-12,-.25,-9.9,12,-.25,-9.9,2.08,-.25,-7.7,-3.64,-.25,-7.7],
// 4 4 -12 -.25 9.9 -3.64 -.25 7.7 2.08 -.25 7.7 12 -.25 9.9
  [4,4,-12,-.25,9.9,-3.64,-.25,7.7,2.08,-.25,7.7,12,-.25,9.9],
// 4 4 -6.83 -.25 -7.7 -3.64 -.25 -7.7 -6.06 -.25 -5.28 -6.83 -.25 -5.28
  [4,4,-6.83,-.25,-7.7,-3.64,-.25,-7.7,-6.06,-.25,-5.28,-6.83,-.25,-5.28],
// 4 4 -9.25 -.25 -5.28 -6.83 -.25 -5.28 -6.06 -.25 5.28 -9.25 -.25 7.7
  [4,4,-9.25,-.25,-5.28,-6.83,-.25,-5.28,-6.06,-.25,5.28,-9.25,-.25,7.7],
// 3 4 -9.25 -.25 7.7 -6.06 -.25 5.28 -3.64 -.25 7.7
  [3,4,-9.25,-.25,7.7,-6.06,-.25,5.28,-3.64,-.25,7.7],
// 3 4 -3.64 -.25 7.7 -12 -.25 9.9 -9.25 -.25 7.7
  [3,4,-3.64,-.25,7.7,-12,-.25,9.9,-9.25,-.25,7.7],
// 3 4 13.96 -.25 7.7 12 -.25 9.9 8.24 -.25 7.7
  [3,4,13.96,-.25,7.7,12,-.25,9.9,8.24,-.25,7.7],
// 3 4 8.24 -.25 7.7 12 -.25 9.9 2.08 -.25 7.7
  [3,4,8.24,-.25,7.7,12,-.25,9.9,2.08,-.25,7.7],
// 3 4 -9.25 -.25 7.7 -12 -.25 9.9 -11.67 -.25 7.7
  [3,4,-9.25,-.25,7.7,-12,-.25,9.9,-11.67,-.25,7.7],
// 4 4 2.08 -.25 -7.7 8.24 -.25 -7.7 5.82 -.25 -5.28 4.5 -.25 -5.28
  [4,4,2.08,-.25,-7.7,8.24,-.25,-7.7,5.82,-.25,-5.28,4.5,-.25,-5.28],
// 4 4 4.5 -.25 5.28 5.82 -.25 5.28 8.24 -.25 7.7 2.08 -.25 7.7
  [4,4,4.5,-.25,5.28,5.82,-.25,5.28,8.24,-.25,7.7,2.08,-.25,7.7],
// 4 4 4.5 -.25 .99 5.82 -.25 2.86 5.82 -.25 5.28 4.5 -.25 5.28
  [4,4,4.5,-.25,.99,5.82,-.25,2.86,5.82,-.25,5.28,4.5,-.25,5.28],
// 4 4 -3.64 -.25 4.4 -3.64 -.25 1.87 -2.76 -.25 .99 1.2 -.25 .99
  [4,4,-3.64,-.25,4.4,-3.64,-.25,1.87,-2.76,-.25,.99,1.2,-.25,.99],
// 4 4 -2.76 -.25 5.28 -3.64 -.25 4.4 1.2 -.25 .99 2.08 -.25 1.87
  [4,4,-2.76,-.25,5.28,-3.64,-.25,4.4,1.2,-.25,.99,2.08,-.25,1.87],
// 4 4 1.2 -.25 5.28 -2.76 -.25 5.28 2.08 -.25 1.87 2.08 -.25 4.4
  [4,4,1.2,-.25,5.28,-2.76,-.25,5.28,2.08,-.25,1.87,2.08,-.25,4.4],
// 4 4 1.2 -.25 -1.43 -2.76 -.25 -1.43 -3.64 -.25 -2.31 -3.64 -.25 -4.4
  [4,4,1.2,-.25,-1.43,-2.76,-.25,-1.43,-3.64,-.25,-2.31,-3.64,-.25,-4.4],
// 4 4 2.08 -.25 -2.31 1.2 -.25 -1.43 -3.64 -.25 -4.4 -2.76 -.25 -5.28
  [4,4,2.08,-.25,-2.31,1.2,-.25,-1.43,-3.64,-.25,-4.4,-2.76,-.25,-5.28],
// 4 4 2.08 -.25 -4.4 2.08 -.25 -2.31 -2.76 -.25 -5.28 1.2 -.25 -5.28
  [4,4,2.08,-.25,-4.4,2.08,-.25,-2.31,-2.76,-.25,-5.28,1.2,-.25,-5.28],
// 3 4 4.5 -.25 .99 3.29 -.25 -.22 4.5 -.25 -1.43
  [3,4,4.5,-.25,.99,3.29,-.25,-.22,4.5,-.25,-1.43],
// 3 4 -6.06 -.25 -1.43 -4.85 -.25 -.22 -6.06 -.25 .99
  [3,4,-6.06,-.25,-1.43,-4.85,-.25,-.22,-6.06,-.25,.99],
// 3 4 -6.06 -.25 -5.28 -6.06 -.25 -1.43 -6.83 -.25 -5.28
  [3,4,-6.06,-.25,-5.28,-6.06,-.25,-1.43,-6.83,-.25,-5.28],
// 3 4 -6.83 -.25 -5.28 -6.06 -.25 -1.43 -6.06 -.25 .99
  [3,4,-6.83,-.25,-5.28,-6.06,-.25,-1.43,-6.06,-.25,.99],
// 3 4 -6.06 -.25 .99 -6.06 -.25 5.28 -6.83 -.25 -5.28
  [3,4,-6.06,-.25,.99,-6.06,-.25,5.28,-6.83,-.25,-5.28],
// 4 4 5.82 -.25 2.86 5.82 -.25 -2.86 8.24 -.25 -2.86 8.24 -.25 2.86
  [4,4,5.82,-.25,2.86,5.82,-.25,-2.86,8.24,-.25,-2.86,8.24,-.25,2.86],
// 4 4 4.5 -.25 .99 4.5 -.25 -1.43 5.82 -.25 -2.86 5.82 -.25 2.86
  [4,4,4.5,-.25,.99,4.5,-.25,-1.43,5.82,-.25,-2.86,5.82,-.25,2.86],
// 4 4 5.82 -.25 -5.28 5.82 -.25 -2.86 4.5 -.25 -1.43 4.5 -.25 -5.28
  [4,4,5.82,-.25,-5.28,5.82,-.25,-2.86,4.5,-.25,-1.43,4.5,-.25,-5.28],
// 4 4 8.24 -.25 2.86 8.24 -.25 -2.86 9.12 -.25 -1.43 9.12 -.25 .99
  [4,4,8.24,-.25,2.86,8.24,-.25,-2.86,9.12,-.25,-1.43,9.12,-.25,.99],
// 4 4 8.24 -.25 4.4 8.24 -.25 2.86 9.12 -.25 .99 13.08 -.25 .99
  [4,4,8.24,-.25,4.4,8.24,-.25,2.86,9.12,-.25,.99,13.08,-.25,.99],
// 4 4 9.12 -.25 5.28 8.24 -.25 4.4 13.08 -.25 .99 13.96 -.25 1.87
  [4,4,9.12,-.25,5.28,8.24,-.25,4.4,13.08,-.25,.99,13.96,-.25,1.87],
// 4 4 13.08 -.25 5.28 9.12 -.25 5.28 13.96 -.25 1.87 13.96 -.25 4.4
  [4,4,13.08,-.25,5.28,9.12,-.25,5.28,13.96,-.25,1.87,13.96,-.25,4.4],
// 4 4 13.08 -.25 -1.43 9.12 -.25 -1.43 8.24 -.25 -2.86 8.24 -.25 -4.4
  [4,4,13.08,-.25,-1.43,9.12,-.25,-1.43,8.24,-.25,-2.86,8.24,-.25,-4.4],
// 4 4 13.96 -.25 -2.31 13.08 -.25 -1.43 8.24 -.25 -4.4 9.12 -.25 -5.28
  [4,4,13.96,-.25,-2.31,13.08,-.25,-1.43,8.24,-.25,-4.4,9.12,-.25,-5.28],
// 4 4 13.96 -.25 -4.4 13.96 -.25 -2.31 9.12 -.25 -5.28 13.08 -.25 -5.28
  [4,4,13.96,-.25,-4.4,13.96,-.25,-2.31,9.12,-.25,-5.28,13.08,-.25,-5.28],
// 3 4 16.38 -.25 .99 15.17 -.25 -.22 16.38 -.25 -1.43
  [3,4,16.38,-.25,.99,15.17,-.25,-.22,16.38,-.25,-1.43],
// 1 4 -12 -.25 0 0 0 -11.55 0 1 0 11.55 0 0 48\2-4ndis.dat
  [1,4,-12,-.25,0,0,0,-11.55,0,1,0,11.55,0,0, ldraw_lib__48__2_4ndis()],
// 1 4 12 -.25 0 0 0 11.55 0 1 0 11.55 0 0 48\2-4ndis.dat
  [1,4,12,-.25,0,0,0,11.55,0,1,0,11.55,0,0, ldraw_lib__48__2_4ndis()],
// 4 4 -23.55 -.25 11.55 -12 -.25 11.55 30 -.25 19 -30 -.25 19
  [4,4,-23.55,-.25,11.55,-12,-.25,11.55,30,-.25,19,-30,-.25,19],
// 4 4 -30 -.25 19 -30 -.25 -19 -23.55 -.25 0 -23.55 -.25 11.55
  [4,4,-30,-.25,19,-30,-.25,-19,-23.55,-.25,0,-23.55,-.25,11.55],
// 4 4 -12 -.25 -11.55 -23.55 -.25 -11.55 -30 -.25 -19 30 -.25 -19
  [4,4,-12,-.25,-11.55,-23.55,-.25,-11.55,-30,-.25,-19,30,-.25,-19],
// 4 4 30 -.25 -19 30 -.25 19 23.55 -.25 0 23.55 -.25 -11.55
  [4,4,30,-.25,-19,30,-.25,19,23.55,-.25,0,23.55,-.25,-11.55],
// 
// 0 // Small box
// 1 16 0 -.25 0 30 0 0 0 .25 0 0 0 19 box5-12.dat
  [1,16,0,-.25,0,30,0,0,0,.25,0,0,0,19, ldraw_lib__box5_12()],
];
module ldraw_lib__004747a(step=0, col=false, unit=2/5, alt=false, line=0.2, solid=!$preview)
    makepoly(ldraw_lib__004747a(), step=step, col=col, unit=unit, alt=alt, line=line, solid=solid);
ldraw_lib__004747a(line=0.2);
